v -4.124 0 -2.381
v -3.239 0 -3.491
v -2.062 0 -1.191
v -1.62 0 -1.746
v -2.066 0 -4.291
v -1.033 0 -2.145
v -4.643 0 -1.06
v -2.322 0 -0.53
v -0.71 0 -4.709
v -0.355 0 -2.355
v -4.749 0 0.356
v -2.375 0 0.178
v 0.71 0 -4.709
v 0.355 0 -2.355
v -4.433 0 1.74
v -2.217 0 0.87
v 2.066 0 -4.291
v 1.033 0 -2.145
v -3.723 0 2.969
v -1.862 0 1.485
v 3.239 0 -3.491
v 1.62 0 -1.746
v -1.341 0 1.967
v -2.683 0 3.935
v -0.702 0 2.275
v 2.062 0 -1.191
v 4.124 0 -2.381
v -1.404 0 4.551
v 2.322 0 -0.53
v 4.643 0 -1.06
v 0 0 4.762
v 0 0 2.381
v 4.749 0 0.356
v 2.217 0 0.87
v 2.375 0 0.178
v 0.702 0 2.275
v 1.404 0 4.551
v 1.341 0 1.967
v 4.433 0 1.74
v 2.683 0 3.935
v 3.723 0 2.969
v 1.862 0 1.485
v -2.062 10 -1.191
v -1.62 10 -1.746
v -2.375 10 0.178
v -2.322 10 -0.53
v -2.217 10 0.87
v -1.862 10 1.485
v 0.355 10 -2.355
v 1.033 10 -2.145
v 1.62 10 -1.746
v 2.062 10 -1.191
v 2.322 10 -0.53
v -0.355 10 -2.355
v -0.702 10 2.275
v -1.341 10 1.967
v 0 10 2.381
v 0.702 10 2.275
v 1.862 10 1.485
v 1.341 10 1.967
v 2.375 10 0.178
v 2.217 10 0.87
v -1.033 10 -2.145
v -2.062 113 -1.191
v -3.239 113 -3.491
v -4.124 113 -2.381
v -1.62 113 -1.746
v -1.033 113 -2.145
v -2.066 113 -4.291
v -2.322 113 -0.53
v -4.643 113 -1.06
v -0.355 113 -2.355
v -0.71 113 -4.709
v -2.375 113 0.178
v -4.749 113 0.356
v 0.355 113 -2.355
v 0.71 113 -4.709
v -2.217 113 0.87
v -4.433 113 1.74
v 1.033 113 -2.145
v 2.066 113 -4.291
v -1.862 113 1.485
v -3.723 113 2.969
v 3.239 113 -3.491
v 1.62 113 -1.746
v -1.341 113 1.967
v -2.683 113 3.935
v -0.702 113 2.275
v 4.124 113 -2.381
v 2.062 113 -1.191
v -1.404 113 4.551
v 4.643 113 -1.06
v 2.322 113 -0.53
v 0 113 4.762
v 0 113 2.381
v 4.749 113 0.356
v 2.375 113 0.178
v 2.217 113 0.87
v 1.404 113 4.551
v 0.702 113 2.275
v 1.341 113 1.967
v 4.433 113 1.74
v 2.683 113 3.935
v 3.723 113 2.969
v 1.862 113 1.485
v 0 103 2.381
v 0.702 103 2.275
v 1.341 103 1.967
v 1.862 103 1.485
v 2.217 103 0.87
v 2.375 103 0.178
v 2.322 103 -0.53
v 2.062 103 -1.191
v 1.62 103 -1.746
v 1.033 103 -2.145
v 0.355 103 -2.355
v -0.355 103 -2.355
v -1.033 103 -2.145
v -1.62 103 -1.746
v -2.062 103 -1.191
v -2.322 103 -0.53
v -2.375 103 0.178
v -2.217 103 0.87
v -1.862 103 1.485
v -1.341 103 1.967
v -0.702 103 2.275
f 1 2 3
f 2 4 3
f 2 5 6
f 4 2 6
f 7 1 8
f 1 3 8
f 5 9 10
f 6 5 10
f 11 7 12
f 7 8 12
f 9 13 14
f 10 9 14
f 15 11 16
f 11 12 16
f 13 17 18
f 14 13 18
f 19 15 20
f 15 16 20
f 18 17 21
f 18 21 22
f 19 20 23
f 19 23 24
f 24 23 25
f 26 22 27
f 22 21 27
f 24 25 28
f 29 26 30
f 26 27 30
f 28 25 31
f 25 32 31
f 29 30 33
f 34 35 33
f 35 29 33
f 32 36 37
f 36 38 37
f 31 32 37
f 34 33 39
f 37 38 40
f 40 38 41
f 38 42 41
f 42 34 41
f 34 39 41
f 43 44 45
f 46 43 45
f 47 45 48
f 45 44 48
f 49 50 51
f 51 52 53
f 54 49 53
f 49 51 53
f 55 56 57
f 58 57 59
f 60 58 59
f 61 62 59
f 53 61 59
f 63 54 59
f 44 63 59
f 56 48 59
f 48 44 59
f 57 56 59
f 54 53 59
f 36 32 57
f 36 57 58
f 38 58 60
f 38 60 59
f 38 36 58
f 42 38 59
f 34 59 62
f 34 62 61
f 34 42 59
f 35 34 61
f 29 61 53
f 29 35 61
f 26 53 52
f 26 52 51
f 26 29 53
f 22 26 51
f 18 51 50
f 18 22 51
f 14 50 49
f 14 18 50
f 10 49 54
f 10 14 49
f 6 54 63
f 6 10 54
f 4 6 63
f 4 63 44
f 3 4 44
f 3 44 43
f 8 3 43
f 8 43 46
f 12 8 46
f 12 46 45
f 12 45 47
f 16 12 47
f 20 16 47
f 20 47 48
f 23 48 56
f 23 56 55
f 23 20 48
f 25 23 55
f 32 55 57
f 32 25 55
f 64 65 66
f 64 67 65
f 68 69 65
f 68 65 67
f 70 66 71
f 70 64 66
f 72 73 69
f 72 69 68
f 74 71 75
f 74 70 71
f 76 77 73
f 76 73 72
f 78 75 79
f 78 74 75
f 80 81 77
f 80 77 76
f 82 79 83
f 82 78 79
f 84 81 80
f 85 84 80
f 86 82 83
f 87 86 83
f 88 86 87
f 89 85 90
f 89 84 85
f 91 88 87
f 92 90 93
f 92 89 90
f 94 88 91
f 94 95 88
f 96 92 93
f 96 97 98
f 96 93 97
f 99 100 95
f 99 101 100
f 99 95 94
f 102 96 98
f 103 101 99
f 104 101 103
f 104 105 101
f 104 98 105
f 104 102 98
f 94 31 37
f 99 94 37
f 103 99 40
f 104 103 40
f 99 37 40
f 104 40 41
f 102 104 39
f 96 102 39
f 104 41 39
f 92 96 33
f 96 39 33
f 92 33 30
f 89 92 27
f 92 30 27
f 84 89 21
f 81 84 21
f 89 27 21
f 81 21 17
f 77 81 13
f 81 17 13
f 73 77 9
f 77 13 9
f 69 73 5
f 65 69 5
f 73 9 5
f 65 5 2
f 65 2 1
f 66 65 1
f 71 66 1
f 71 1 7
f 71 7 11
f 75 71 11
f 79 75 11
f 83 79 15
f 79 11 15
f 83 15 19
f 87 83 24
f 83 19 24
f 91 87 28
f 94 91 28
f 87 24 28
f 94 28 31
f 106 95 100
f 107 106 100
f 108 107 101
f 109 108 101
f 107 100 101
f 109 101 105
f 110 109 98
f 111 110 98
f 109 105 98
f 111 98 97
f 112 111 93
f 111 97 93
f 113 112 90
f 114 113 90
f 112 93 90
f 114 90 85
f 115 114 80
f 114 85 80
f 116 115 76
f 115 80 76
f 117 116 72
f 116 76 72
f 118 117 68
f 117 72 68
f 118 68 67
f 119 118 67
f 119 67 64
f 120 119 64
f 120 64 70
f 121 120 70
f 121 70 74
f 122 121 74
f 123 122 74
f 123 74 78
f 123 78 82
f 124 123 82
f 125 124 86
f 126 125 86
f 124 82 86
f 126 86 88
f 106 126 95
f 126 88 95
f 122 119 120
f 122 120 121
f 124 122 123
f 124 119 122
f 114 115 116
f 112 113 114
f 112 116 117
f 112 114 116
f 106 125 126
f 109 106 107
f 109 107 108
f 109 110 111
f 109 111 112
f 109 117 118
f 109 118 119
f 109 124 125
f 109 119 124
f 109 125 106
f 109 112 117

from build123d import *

# Parameters (mm, degrees)
CROQUIS1_R              = 4.7625
SALIENTE_EXTRUIR1_DEPTH = 113
CROQUIS2_R              = 2.38125
CORTAR_EXTRUIR1_DEPTH   = 10


with BuildPart() as part:
    # Croquis1 → Saliente-Extruir1 (new body)
    with BuildSketch(Plane(origin=(0, 0, 0), x_dir=(1, 0, 0), z_dir=(0, 1, 0))):
        with Locations(Location((0, 0, 0), (0, 0, 270))):
            Circle(CROQUIS1_R)
    extrude(amount=SALIENTE_EXTRUIR1_DEPTH)

    # Croquis2 → Cortar-Extruir1 (cut)
    with BuildSketch(Plane(origin=(0, 113, 0), x_dir=(1, 0, 0), z_dir=(0, 1, 0))):
        with Locations(Location((0, 0, 0), (0, 0, 270))):
            Circle(CROQUIS2_R)
    cortar_extruir1 = extrude(amount=-CORTAR_EXTRUIR1_DEPTH, mode=Mode.SUBTRACT)

    # Simetría1: Cortar-Extruir1 across plane
    add(cortar_extruir1.mirror(Plane.ZX.offset(56.5)), mode=Mode.SUBTRACT)


solid = part.part
